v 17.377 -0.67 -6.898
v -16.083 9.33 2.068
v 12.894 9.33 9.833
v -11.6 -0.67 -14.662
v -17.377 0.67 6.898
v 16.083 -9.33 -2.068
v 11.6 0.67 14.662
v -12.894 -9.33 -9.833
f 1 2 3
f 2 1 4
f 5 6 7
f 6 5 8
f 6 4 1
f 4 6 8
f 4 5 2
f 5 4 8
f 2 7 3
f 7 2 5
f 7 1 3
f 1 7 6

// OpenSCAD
// Generated by generate_scads.py
rotate([120,15,180]) {
  cube(size=[30,20,10], center=true);
}
